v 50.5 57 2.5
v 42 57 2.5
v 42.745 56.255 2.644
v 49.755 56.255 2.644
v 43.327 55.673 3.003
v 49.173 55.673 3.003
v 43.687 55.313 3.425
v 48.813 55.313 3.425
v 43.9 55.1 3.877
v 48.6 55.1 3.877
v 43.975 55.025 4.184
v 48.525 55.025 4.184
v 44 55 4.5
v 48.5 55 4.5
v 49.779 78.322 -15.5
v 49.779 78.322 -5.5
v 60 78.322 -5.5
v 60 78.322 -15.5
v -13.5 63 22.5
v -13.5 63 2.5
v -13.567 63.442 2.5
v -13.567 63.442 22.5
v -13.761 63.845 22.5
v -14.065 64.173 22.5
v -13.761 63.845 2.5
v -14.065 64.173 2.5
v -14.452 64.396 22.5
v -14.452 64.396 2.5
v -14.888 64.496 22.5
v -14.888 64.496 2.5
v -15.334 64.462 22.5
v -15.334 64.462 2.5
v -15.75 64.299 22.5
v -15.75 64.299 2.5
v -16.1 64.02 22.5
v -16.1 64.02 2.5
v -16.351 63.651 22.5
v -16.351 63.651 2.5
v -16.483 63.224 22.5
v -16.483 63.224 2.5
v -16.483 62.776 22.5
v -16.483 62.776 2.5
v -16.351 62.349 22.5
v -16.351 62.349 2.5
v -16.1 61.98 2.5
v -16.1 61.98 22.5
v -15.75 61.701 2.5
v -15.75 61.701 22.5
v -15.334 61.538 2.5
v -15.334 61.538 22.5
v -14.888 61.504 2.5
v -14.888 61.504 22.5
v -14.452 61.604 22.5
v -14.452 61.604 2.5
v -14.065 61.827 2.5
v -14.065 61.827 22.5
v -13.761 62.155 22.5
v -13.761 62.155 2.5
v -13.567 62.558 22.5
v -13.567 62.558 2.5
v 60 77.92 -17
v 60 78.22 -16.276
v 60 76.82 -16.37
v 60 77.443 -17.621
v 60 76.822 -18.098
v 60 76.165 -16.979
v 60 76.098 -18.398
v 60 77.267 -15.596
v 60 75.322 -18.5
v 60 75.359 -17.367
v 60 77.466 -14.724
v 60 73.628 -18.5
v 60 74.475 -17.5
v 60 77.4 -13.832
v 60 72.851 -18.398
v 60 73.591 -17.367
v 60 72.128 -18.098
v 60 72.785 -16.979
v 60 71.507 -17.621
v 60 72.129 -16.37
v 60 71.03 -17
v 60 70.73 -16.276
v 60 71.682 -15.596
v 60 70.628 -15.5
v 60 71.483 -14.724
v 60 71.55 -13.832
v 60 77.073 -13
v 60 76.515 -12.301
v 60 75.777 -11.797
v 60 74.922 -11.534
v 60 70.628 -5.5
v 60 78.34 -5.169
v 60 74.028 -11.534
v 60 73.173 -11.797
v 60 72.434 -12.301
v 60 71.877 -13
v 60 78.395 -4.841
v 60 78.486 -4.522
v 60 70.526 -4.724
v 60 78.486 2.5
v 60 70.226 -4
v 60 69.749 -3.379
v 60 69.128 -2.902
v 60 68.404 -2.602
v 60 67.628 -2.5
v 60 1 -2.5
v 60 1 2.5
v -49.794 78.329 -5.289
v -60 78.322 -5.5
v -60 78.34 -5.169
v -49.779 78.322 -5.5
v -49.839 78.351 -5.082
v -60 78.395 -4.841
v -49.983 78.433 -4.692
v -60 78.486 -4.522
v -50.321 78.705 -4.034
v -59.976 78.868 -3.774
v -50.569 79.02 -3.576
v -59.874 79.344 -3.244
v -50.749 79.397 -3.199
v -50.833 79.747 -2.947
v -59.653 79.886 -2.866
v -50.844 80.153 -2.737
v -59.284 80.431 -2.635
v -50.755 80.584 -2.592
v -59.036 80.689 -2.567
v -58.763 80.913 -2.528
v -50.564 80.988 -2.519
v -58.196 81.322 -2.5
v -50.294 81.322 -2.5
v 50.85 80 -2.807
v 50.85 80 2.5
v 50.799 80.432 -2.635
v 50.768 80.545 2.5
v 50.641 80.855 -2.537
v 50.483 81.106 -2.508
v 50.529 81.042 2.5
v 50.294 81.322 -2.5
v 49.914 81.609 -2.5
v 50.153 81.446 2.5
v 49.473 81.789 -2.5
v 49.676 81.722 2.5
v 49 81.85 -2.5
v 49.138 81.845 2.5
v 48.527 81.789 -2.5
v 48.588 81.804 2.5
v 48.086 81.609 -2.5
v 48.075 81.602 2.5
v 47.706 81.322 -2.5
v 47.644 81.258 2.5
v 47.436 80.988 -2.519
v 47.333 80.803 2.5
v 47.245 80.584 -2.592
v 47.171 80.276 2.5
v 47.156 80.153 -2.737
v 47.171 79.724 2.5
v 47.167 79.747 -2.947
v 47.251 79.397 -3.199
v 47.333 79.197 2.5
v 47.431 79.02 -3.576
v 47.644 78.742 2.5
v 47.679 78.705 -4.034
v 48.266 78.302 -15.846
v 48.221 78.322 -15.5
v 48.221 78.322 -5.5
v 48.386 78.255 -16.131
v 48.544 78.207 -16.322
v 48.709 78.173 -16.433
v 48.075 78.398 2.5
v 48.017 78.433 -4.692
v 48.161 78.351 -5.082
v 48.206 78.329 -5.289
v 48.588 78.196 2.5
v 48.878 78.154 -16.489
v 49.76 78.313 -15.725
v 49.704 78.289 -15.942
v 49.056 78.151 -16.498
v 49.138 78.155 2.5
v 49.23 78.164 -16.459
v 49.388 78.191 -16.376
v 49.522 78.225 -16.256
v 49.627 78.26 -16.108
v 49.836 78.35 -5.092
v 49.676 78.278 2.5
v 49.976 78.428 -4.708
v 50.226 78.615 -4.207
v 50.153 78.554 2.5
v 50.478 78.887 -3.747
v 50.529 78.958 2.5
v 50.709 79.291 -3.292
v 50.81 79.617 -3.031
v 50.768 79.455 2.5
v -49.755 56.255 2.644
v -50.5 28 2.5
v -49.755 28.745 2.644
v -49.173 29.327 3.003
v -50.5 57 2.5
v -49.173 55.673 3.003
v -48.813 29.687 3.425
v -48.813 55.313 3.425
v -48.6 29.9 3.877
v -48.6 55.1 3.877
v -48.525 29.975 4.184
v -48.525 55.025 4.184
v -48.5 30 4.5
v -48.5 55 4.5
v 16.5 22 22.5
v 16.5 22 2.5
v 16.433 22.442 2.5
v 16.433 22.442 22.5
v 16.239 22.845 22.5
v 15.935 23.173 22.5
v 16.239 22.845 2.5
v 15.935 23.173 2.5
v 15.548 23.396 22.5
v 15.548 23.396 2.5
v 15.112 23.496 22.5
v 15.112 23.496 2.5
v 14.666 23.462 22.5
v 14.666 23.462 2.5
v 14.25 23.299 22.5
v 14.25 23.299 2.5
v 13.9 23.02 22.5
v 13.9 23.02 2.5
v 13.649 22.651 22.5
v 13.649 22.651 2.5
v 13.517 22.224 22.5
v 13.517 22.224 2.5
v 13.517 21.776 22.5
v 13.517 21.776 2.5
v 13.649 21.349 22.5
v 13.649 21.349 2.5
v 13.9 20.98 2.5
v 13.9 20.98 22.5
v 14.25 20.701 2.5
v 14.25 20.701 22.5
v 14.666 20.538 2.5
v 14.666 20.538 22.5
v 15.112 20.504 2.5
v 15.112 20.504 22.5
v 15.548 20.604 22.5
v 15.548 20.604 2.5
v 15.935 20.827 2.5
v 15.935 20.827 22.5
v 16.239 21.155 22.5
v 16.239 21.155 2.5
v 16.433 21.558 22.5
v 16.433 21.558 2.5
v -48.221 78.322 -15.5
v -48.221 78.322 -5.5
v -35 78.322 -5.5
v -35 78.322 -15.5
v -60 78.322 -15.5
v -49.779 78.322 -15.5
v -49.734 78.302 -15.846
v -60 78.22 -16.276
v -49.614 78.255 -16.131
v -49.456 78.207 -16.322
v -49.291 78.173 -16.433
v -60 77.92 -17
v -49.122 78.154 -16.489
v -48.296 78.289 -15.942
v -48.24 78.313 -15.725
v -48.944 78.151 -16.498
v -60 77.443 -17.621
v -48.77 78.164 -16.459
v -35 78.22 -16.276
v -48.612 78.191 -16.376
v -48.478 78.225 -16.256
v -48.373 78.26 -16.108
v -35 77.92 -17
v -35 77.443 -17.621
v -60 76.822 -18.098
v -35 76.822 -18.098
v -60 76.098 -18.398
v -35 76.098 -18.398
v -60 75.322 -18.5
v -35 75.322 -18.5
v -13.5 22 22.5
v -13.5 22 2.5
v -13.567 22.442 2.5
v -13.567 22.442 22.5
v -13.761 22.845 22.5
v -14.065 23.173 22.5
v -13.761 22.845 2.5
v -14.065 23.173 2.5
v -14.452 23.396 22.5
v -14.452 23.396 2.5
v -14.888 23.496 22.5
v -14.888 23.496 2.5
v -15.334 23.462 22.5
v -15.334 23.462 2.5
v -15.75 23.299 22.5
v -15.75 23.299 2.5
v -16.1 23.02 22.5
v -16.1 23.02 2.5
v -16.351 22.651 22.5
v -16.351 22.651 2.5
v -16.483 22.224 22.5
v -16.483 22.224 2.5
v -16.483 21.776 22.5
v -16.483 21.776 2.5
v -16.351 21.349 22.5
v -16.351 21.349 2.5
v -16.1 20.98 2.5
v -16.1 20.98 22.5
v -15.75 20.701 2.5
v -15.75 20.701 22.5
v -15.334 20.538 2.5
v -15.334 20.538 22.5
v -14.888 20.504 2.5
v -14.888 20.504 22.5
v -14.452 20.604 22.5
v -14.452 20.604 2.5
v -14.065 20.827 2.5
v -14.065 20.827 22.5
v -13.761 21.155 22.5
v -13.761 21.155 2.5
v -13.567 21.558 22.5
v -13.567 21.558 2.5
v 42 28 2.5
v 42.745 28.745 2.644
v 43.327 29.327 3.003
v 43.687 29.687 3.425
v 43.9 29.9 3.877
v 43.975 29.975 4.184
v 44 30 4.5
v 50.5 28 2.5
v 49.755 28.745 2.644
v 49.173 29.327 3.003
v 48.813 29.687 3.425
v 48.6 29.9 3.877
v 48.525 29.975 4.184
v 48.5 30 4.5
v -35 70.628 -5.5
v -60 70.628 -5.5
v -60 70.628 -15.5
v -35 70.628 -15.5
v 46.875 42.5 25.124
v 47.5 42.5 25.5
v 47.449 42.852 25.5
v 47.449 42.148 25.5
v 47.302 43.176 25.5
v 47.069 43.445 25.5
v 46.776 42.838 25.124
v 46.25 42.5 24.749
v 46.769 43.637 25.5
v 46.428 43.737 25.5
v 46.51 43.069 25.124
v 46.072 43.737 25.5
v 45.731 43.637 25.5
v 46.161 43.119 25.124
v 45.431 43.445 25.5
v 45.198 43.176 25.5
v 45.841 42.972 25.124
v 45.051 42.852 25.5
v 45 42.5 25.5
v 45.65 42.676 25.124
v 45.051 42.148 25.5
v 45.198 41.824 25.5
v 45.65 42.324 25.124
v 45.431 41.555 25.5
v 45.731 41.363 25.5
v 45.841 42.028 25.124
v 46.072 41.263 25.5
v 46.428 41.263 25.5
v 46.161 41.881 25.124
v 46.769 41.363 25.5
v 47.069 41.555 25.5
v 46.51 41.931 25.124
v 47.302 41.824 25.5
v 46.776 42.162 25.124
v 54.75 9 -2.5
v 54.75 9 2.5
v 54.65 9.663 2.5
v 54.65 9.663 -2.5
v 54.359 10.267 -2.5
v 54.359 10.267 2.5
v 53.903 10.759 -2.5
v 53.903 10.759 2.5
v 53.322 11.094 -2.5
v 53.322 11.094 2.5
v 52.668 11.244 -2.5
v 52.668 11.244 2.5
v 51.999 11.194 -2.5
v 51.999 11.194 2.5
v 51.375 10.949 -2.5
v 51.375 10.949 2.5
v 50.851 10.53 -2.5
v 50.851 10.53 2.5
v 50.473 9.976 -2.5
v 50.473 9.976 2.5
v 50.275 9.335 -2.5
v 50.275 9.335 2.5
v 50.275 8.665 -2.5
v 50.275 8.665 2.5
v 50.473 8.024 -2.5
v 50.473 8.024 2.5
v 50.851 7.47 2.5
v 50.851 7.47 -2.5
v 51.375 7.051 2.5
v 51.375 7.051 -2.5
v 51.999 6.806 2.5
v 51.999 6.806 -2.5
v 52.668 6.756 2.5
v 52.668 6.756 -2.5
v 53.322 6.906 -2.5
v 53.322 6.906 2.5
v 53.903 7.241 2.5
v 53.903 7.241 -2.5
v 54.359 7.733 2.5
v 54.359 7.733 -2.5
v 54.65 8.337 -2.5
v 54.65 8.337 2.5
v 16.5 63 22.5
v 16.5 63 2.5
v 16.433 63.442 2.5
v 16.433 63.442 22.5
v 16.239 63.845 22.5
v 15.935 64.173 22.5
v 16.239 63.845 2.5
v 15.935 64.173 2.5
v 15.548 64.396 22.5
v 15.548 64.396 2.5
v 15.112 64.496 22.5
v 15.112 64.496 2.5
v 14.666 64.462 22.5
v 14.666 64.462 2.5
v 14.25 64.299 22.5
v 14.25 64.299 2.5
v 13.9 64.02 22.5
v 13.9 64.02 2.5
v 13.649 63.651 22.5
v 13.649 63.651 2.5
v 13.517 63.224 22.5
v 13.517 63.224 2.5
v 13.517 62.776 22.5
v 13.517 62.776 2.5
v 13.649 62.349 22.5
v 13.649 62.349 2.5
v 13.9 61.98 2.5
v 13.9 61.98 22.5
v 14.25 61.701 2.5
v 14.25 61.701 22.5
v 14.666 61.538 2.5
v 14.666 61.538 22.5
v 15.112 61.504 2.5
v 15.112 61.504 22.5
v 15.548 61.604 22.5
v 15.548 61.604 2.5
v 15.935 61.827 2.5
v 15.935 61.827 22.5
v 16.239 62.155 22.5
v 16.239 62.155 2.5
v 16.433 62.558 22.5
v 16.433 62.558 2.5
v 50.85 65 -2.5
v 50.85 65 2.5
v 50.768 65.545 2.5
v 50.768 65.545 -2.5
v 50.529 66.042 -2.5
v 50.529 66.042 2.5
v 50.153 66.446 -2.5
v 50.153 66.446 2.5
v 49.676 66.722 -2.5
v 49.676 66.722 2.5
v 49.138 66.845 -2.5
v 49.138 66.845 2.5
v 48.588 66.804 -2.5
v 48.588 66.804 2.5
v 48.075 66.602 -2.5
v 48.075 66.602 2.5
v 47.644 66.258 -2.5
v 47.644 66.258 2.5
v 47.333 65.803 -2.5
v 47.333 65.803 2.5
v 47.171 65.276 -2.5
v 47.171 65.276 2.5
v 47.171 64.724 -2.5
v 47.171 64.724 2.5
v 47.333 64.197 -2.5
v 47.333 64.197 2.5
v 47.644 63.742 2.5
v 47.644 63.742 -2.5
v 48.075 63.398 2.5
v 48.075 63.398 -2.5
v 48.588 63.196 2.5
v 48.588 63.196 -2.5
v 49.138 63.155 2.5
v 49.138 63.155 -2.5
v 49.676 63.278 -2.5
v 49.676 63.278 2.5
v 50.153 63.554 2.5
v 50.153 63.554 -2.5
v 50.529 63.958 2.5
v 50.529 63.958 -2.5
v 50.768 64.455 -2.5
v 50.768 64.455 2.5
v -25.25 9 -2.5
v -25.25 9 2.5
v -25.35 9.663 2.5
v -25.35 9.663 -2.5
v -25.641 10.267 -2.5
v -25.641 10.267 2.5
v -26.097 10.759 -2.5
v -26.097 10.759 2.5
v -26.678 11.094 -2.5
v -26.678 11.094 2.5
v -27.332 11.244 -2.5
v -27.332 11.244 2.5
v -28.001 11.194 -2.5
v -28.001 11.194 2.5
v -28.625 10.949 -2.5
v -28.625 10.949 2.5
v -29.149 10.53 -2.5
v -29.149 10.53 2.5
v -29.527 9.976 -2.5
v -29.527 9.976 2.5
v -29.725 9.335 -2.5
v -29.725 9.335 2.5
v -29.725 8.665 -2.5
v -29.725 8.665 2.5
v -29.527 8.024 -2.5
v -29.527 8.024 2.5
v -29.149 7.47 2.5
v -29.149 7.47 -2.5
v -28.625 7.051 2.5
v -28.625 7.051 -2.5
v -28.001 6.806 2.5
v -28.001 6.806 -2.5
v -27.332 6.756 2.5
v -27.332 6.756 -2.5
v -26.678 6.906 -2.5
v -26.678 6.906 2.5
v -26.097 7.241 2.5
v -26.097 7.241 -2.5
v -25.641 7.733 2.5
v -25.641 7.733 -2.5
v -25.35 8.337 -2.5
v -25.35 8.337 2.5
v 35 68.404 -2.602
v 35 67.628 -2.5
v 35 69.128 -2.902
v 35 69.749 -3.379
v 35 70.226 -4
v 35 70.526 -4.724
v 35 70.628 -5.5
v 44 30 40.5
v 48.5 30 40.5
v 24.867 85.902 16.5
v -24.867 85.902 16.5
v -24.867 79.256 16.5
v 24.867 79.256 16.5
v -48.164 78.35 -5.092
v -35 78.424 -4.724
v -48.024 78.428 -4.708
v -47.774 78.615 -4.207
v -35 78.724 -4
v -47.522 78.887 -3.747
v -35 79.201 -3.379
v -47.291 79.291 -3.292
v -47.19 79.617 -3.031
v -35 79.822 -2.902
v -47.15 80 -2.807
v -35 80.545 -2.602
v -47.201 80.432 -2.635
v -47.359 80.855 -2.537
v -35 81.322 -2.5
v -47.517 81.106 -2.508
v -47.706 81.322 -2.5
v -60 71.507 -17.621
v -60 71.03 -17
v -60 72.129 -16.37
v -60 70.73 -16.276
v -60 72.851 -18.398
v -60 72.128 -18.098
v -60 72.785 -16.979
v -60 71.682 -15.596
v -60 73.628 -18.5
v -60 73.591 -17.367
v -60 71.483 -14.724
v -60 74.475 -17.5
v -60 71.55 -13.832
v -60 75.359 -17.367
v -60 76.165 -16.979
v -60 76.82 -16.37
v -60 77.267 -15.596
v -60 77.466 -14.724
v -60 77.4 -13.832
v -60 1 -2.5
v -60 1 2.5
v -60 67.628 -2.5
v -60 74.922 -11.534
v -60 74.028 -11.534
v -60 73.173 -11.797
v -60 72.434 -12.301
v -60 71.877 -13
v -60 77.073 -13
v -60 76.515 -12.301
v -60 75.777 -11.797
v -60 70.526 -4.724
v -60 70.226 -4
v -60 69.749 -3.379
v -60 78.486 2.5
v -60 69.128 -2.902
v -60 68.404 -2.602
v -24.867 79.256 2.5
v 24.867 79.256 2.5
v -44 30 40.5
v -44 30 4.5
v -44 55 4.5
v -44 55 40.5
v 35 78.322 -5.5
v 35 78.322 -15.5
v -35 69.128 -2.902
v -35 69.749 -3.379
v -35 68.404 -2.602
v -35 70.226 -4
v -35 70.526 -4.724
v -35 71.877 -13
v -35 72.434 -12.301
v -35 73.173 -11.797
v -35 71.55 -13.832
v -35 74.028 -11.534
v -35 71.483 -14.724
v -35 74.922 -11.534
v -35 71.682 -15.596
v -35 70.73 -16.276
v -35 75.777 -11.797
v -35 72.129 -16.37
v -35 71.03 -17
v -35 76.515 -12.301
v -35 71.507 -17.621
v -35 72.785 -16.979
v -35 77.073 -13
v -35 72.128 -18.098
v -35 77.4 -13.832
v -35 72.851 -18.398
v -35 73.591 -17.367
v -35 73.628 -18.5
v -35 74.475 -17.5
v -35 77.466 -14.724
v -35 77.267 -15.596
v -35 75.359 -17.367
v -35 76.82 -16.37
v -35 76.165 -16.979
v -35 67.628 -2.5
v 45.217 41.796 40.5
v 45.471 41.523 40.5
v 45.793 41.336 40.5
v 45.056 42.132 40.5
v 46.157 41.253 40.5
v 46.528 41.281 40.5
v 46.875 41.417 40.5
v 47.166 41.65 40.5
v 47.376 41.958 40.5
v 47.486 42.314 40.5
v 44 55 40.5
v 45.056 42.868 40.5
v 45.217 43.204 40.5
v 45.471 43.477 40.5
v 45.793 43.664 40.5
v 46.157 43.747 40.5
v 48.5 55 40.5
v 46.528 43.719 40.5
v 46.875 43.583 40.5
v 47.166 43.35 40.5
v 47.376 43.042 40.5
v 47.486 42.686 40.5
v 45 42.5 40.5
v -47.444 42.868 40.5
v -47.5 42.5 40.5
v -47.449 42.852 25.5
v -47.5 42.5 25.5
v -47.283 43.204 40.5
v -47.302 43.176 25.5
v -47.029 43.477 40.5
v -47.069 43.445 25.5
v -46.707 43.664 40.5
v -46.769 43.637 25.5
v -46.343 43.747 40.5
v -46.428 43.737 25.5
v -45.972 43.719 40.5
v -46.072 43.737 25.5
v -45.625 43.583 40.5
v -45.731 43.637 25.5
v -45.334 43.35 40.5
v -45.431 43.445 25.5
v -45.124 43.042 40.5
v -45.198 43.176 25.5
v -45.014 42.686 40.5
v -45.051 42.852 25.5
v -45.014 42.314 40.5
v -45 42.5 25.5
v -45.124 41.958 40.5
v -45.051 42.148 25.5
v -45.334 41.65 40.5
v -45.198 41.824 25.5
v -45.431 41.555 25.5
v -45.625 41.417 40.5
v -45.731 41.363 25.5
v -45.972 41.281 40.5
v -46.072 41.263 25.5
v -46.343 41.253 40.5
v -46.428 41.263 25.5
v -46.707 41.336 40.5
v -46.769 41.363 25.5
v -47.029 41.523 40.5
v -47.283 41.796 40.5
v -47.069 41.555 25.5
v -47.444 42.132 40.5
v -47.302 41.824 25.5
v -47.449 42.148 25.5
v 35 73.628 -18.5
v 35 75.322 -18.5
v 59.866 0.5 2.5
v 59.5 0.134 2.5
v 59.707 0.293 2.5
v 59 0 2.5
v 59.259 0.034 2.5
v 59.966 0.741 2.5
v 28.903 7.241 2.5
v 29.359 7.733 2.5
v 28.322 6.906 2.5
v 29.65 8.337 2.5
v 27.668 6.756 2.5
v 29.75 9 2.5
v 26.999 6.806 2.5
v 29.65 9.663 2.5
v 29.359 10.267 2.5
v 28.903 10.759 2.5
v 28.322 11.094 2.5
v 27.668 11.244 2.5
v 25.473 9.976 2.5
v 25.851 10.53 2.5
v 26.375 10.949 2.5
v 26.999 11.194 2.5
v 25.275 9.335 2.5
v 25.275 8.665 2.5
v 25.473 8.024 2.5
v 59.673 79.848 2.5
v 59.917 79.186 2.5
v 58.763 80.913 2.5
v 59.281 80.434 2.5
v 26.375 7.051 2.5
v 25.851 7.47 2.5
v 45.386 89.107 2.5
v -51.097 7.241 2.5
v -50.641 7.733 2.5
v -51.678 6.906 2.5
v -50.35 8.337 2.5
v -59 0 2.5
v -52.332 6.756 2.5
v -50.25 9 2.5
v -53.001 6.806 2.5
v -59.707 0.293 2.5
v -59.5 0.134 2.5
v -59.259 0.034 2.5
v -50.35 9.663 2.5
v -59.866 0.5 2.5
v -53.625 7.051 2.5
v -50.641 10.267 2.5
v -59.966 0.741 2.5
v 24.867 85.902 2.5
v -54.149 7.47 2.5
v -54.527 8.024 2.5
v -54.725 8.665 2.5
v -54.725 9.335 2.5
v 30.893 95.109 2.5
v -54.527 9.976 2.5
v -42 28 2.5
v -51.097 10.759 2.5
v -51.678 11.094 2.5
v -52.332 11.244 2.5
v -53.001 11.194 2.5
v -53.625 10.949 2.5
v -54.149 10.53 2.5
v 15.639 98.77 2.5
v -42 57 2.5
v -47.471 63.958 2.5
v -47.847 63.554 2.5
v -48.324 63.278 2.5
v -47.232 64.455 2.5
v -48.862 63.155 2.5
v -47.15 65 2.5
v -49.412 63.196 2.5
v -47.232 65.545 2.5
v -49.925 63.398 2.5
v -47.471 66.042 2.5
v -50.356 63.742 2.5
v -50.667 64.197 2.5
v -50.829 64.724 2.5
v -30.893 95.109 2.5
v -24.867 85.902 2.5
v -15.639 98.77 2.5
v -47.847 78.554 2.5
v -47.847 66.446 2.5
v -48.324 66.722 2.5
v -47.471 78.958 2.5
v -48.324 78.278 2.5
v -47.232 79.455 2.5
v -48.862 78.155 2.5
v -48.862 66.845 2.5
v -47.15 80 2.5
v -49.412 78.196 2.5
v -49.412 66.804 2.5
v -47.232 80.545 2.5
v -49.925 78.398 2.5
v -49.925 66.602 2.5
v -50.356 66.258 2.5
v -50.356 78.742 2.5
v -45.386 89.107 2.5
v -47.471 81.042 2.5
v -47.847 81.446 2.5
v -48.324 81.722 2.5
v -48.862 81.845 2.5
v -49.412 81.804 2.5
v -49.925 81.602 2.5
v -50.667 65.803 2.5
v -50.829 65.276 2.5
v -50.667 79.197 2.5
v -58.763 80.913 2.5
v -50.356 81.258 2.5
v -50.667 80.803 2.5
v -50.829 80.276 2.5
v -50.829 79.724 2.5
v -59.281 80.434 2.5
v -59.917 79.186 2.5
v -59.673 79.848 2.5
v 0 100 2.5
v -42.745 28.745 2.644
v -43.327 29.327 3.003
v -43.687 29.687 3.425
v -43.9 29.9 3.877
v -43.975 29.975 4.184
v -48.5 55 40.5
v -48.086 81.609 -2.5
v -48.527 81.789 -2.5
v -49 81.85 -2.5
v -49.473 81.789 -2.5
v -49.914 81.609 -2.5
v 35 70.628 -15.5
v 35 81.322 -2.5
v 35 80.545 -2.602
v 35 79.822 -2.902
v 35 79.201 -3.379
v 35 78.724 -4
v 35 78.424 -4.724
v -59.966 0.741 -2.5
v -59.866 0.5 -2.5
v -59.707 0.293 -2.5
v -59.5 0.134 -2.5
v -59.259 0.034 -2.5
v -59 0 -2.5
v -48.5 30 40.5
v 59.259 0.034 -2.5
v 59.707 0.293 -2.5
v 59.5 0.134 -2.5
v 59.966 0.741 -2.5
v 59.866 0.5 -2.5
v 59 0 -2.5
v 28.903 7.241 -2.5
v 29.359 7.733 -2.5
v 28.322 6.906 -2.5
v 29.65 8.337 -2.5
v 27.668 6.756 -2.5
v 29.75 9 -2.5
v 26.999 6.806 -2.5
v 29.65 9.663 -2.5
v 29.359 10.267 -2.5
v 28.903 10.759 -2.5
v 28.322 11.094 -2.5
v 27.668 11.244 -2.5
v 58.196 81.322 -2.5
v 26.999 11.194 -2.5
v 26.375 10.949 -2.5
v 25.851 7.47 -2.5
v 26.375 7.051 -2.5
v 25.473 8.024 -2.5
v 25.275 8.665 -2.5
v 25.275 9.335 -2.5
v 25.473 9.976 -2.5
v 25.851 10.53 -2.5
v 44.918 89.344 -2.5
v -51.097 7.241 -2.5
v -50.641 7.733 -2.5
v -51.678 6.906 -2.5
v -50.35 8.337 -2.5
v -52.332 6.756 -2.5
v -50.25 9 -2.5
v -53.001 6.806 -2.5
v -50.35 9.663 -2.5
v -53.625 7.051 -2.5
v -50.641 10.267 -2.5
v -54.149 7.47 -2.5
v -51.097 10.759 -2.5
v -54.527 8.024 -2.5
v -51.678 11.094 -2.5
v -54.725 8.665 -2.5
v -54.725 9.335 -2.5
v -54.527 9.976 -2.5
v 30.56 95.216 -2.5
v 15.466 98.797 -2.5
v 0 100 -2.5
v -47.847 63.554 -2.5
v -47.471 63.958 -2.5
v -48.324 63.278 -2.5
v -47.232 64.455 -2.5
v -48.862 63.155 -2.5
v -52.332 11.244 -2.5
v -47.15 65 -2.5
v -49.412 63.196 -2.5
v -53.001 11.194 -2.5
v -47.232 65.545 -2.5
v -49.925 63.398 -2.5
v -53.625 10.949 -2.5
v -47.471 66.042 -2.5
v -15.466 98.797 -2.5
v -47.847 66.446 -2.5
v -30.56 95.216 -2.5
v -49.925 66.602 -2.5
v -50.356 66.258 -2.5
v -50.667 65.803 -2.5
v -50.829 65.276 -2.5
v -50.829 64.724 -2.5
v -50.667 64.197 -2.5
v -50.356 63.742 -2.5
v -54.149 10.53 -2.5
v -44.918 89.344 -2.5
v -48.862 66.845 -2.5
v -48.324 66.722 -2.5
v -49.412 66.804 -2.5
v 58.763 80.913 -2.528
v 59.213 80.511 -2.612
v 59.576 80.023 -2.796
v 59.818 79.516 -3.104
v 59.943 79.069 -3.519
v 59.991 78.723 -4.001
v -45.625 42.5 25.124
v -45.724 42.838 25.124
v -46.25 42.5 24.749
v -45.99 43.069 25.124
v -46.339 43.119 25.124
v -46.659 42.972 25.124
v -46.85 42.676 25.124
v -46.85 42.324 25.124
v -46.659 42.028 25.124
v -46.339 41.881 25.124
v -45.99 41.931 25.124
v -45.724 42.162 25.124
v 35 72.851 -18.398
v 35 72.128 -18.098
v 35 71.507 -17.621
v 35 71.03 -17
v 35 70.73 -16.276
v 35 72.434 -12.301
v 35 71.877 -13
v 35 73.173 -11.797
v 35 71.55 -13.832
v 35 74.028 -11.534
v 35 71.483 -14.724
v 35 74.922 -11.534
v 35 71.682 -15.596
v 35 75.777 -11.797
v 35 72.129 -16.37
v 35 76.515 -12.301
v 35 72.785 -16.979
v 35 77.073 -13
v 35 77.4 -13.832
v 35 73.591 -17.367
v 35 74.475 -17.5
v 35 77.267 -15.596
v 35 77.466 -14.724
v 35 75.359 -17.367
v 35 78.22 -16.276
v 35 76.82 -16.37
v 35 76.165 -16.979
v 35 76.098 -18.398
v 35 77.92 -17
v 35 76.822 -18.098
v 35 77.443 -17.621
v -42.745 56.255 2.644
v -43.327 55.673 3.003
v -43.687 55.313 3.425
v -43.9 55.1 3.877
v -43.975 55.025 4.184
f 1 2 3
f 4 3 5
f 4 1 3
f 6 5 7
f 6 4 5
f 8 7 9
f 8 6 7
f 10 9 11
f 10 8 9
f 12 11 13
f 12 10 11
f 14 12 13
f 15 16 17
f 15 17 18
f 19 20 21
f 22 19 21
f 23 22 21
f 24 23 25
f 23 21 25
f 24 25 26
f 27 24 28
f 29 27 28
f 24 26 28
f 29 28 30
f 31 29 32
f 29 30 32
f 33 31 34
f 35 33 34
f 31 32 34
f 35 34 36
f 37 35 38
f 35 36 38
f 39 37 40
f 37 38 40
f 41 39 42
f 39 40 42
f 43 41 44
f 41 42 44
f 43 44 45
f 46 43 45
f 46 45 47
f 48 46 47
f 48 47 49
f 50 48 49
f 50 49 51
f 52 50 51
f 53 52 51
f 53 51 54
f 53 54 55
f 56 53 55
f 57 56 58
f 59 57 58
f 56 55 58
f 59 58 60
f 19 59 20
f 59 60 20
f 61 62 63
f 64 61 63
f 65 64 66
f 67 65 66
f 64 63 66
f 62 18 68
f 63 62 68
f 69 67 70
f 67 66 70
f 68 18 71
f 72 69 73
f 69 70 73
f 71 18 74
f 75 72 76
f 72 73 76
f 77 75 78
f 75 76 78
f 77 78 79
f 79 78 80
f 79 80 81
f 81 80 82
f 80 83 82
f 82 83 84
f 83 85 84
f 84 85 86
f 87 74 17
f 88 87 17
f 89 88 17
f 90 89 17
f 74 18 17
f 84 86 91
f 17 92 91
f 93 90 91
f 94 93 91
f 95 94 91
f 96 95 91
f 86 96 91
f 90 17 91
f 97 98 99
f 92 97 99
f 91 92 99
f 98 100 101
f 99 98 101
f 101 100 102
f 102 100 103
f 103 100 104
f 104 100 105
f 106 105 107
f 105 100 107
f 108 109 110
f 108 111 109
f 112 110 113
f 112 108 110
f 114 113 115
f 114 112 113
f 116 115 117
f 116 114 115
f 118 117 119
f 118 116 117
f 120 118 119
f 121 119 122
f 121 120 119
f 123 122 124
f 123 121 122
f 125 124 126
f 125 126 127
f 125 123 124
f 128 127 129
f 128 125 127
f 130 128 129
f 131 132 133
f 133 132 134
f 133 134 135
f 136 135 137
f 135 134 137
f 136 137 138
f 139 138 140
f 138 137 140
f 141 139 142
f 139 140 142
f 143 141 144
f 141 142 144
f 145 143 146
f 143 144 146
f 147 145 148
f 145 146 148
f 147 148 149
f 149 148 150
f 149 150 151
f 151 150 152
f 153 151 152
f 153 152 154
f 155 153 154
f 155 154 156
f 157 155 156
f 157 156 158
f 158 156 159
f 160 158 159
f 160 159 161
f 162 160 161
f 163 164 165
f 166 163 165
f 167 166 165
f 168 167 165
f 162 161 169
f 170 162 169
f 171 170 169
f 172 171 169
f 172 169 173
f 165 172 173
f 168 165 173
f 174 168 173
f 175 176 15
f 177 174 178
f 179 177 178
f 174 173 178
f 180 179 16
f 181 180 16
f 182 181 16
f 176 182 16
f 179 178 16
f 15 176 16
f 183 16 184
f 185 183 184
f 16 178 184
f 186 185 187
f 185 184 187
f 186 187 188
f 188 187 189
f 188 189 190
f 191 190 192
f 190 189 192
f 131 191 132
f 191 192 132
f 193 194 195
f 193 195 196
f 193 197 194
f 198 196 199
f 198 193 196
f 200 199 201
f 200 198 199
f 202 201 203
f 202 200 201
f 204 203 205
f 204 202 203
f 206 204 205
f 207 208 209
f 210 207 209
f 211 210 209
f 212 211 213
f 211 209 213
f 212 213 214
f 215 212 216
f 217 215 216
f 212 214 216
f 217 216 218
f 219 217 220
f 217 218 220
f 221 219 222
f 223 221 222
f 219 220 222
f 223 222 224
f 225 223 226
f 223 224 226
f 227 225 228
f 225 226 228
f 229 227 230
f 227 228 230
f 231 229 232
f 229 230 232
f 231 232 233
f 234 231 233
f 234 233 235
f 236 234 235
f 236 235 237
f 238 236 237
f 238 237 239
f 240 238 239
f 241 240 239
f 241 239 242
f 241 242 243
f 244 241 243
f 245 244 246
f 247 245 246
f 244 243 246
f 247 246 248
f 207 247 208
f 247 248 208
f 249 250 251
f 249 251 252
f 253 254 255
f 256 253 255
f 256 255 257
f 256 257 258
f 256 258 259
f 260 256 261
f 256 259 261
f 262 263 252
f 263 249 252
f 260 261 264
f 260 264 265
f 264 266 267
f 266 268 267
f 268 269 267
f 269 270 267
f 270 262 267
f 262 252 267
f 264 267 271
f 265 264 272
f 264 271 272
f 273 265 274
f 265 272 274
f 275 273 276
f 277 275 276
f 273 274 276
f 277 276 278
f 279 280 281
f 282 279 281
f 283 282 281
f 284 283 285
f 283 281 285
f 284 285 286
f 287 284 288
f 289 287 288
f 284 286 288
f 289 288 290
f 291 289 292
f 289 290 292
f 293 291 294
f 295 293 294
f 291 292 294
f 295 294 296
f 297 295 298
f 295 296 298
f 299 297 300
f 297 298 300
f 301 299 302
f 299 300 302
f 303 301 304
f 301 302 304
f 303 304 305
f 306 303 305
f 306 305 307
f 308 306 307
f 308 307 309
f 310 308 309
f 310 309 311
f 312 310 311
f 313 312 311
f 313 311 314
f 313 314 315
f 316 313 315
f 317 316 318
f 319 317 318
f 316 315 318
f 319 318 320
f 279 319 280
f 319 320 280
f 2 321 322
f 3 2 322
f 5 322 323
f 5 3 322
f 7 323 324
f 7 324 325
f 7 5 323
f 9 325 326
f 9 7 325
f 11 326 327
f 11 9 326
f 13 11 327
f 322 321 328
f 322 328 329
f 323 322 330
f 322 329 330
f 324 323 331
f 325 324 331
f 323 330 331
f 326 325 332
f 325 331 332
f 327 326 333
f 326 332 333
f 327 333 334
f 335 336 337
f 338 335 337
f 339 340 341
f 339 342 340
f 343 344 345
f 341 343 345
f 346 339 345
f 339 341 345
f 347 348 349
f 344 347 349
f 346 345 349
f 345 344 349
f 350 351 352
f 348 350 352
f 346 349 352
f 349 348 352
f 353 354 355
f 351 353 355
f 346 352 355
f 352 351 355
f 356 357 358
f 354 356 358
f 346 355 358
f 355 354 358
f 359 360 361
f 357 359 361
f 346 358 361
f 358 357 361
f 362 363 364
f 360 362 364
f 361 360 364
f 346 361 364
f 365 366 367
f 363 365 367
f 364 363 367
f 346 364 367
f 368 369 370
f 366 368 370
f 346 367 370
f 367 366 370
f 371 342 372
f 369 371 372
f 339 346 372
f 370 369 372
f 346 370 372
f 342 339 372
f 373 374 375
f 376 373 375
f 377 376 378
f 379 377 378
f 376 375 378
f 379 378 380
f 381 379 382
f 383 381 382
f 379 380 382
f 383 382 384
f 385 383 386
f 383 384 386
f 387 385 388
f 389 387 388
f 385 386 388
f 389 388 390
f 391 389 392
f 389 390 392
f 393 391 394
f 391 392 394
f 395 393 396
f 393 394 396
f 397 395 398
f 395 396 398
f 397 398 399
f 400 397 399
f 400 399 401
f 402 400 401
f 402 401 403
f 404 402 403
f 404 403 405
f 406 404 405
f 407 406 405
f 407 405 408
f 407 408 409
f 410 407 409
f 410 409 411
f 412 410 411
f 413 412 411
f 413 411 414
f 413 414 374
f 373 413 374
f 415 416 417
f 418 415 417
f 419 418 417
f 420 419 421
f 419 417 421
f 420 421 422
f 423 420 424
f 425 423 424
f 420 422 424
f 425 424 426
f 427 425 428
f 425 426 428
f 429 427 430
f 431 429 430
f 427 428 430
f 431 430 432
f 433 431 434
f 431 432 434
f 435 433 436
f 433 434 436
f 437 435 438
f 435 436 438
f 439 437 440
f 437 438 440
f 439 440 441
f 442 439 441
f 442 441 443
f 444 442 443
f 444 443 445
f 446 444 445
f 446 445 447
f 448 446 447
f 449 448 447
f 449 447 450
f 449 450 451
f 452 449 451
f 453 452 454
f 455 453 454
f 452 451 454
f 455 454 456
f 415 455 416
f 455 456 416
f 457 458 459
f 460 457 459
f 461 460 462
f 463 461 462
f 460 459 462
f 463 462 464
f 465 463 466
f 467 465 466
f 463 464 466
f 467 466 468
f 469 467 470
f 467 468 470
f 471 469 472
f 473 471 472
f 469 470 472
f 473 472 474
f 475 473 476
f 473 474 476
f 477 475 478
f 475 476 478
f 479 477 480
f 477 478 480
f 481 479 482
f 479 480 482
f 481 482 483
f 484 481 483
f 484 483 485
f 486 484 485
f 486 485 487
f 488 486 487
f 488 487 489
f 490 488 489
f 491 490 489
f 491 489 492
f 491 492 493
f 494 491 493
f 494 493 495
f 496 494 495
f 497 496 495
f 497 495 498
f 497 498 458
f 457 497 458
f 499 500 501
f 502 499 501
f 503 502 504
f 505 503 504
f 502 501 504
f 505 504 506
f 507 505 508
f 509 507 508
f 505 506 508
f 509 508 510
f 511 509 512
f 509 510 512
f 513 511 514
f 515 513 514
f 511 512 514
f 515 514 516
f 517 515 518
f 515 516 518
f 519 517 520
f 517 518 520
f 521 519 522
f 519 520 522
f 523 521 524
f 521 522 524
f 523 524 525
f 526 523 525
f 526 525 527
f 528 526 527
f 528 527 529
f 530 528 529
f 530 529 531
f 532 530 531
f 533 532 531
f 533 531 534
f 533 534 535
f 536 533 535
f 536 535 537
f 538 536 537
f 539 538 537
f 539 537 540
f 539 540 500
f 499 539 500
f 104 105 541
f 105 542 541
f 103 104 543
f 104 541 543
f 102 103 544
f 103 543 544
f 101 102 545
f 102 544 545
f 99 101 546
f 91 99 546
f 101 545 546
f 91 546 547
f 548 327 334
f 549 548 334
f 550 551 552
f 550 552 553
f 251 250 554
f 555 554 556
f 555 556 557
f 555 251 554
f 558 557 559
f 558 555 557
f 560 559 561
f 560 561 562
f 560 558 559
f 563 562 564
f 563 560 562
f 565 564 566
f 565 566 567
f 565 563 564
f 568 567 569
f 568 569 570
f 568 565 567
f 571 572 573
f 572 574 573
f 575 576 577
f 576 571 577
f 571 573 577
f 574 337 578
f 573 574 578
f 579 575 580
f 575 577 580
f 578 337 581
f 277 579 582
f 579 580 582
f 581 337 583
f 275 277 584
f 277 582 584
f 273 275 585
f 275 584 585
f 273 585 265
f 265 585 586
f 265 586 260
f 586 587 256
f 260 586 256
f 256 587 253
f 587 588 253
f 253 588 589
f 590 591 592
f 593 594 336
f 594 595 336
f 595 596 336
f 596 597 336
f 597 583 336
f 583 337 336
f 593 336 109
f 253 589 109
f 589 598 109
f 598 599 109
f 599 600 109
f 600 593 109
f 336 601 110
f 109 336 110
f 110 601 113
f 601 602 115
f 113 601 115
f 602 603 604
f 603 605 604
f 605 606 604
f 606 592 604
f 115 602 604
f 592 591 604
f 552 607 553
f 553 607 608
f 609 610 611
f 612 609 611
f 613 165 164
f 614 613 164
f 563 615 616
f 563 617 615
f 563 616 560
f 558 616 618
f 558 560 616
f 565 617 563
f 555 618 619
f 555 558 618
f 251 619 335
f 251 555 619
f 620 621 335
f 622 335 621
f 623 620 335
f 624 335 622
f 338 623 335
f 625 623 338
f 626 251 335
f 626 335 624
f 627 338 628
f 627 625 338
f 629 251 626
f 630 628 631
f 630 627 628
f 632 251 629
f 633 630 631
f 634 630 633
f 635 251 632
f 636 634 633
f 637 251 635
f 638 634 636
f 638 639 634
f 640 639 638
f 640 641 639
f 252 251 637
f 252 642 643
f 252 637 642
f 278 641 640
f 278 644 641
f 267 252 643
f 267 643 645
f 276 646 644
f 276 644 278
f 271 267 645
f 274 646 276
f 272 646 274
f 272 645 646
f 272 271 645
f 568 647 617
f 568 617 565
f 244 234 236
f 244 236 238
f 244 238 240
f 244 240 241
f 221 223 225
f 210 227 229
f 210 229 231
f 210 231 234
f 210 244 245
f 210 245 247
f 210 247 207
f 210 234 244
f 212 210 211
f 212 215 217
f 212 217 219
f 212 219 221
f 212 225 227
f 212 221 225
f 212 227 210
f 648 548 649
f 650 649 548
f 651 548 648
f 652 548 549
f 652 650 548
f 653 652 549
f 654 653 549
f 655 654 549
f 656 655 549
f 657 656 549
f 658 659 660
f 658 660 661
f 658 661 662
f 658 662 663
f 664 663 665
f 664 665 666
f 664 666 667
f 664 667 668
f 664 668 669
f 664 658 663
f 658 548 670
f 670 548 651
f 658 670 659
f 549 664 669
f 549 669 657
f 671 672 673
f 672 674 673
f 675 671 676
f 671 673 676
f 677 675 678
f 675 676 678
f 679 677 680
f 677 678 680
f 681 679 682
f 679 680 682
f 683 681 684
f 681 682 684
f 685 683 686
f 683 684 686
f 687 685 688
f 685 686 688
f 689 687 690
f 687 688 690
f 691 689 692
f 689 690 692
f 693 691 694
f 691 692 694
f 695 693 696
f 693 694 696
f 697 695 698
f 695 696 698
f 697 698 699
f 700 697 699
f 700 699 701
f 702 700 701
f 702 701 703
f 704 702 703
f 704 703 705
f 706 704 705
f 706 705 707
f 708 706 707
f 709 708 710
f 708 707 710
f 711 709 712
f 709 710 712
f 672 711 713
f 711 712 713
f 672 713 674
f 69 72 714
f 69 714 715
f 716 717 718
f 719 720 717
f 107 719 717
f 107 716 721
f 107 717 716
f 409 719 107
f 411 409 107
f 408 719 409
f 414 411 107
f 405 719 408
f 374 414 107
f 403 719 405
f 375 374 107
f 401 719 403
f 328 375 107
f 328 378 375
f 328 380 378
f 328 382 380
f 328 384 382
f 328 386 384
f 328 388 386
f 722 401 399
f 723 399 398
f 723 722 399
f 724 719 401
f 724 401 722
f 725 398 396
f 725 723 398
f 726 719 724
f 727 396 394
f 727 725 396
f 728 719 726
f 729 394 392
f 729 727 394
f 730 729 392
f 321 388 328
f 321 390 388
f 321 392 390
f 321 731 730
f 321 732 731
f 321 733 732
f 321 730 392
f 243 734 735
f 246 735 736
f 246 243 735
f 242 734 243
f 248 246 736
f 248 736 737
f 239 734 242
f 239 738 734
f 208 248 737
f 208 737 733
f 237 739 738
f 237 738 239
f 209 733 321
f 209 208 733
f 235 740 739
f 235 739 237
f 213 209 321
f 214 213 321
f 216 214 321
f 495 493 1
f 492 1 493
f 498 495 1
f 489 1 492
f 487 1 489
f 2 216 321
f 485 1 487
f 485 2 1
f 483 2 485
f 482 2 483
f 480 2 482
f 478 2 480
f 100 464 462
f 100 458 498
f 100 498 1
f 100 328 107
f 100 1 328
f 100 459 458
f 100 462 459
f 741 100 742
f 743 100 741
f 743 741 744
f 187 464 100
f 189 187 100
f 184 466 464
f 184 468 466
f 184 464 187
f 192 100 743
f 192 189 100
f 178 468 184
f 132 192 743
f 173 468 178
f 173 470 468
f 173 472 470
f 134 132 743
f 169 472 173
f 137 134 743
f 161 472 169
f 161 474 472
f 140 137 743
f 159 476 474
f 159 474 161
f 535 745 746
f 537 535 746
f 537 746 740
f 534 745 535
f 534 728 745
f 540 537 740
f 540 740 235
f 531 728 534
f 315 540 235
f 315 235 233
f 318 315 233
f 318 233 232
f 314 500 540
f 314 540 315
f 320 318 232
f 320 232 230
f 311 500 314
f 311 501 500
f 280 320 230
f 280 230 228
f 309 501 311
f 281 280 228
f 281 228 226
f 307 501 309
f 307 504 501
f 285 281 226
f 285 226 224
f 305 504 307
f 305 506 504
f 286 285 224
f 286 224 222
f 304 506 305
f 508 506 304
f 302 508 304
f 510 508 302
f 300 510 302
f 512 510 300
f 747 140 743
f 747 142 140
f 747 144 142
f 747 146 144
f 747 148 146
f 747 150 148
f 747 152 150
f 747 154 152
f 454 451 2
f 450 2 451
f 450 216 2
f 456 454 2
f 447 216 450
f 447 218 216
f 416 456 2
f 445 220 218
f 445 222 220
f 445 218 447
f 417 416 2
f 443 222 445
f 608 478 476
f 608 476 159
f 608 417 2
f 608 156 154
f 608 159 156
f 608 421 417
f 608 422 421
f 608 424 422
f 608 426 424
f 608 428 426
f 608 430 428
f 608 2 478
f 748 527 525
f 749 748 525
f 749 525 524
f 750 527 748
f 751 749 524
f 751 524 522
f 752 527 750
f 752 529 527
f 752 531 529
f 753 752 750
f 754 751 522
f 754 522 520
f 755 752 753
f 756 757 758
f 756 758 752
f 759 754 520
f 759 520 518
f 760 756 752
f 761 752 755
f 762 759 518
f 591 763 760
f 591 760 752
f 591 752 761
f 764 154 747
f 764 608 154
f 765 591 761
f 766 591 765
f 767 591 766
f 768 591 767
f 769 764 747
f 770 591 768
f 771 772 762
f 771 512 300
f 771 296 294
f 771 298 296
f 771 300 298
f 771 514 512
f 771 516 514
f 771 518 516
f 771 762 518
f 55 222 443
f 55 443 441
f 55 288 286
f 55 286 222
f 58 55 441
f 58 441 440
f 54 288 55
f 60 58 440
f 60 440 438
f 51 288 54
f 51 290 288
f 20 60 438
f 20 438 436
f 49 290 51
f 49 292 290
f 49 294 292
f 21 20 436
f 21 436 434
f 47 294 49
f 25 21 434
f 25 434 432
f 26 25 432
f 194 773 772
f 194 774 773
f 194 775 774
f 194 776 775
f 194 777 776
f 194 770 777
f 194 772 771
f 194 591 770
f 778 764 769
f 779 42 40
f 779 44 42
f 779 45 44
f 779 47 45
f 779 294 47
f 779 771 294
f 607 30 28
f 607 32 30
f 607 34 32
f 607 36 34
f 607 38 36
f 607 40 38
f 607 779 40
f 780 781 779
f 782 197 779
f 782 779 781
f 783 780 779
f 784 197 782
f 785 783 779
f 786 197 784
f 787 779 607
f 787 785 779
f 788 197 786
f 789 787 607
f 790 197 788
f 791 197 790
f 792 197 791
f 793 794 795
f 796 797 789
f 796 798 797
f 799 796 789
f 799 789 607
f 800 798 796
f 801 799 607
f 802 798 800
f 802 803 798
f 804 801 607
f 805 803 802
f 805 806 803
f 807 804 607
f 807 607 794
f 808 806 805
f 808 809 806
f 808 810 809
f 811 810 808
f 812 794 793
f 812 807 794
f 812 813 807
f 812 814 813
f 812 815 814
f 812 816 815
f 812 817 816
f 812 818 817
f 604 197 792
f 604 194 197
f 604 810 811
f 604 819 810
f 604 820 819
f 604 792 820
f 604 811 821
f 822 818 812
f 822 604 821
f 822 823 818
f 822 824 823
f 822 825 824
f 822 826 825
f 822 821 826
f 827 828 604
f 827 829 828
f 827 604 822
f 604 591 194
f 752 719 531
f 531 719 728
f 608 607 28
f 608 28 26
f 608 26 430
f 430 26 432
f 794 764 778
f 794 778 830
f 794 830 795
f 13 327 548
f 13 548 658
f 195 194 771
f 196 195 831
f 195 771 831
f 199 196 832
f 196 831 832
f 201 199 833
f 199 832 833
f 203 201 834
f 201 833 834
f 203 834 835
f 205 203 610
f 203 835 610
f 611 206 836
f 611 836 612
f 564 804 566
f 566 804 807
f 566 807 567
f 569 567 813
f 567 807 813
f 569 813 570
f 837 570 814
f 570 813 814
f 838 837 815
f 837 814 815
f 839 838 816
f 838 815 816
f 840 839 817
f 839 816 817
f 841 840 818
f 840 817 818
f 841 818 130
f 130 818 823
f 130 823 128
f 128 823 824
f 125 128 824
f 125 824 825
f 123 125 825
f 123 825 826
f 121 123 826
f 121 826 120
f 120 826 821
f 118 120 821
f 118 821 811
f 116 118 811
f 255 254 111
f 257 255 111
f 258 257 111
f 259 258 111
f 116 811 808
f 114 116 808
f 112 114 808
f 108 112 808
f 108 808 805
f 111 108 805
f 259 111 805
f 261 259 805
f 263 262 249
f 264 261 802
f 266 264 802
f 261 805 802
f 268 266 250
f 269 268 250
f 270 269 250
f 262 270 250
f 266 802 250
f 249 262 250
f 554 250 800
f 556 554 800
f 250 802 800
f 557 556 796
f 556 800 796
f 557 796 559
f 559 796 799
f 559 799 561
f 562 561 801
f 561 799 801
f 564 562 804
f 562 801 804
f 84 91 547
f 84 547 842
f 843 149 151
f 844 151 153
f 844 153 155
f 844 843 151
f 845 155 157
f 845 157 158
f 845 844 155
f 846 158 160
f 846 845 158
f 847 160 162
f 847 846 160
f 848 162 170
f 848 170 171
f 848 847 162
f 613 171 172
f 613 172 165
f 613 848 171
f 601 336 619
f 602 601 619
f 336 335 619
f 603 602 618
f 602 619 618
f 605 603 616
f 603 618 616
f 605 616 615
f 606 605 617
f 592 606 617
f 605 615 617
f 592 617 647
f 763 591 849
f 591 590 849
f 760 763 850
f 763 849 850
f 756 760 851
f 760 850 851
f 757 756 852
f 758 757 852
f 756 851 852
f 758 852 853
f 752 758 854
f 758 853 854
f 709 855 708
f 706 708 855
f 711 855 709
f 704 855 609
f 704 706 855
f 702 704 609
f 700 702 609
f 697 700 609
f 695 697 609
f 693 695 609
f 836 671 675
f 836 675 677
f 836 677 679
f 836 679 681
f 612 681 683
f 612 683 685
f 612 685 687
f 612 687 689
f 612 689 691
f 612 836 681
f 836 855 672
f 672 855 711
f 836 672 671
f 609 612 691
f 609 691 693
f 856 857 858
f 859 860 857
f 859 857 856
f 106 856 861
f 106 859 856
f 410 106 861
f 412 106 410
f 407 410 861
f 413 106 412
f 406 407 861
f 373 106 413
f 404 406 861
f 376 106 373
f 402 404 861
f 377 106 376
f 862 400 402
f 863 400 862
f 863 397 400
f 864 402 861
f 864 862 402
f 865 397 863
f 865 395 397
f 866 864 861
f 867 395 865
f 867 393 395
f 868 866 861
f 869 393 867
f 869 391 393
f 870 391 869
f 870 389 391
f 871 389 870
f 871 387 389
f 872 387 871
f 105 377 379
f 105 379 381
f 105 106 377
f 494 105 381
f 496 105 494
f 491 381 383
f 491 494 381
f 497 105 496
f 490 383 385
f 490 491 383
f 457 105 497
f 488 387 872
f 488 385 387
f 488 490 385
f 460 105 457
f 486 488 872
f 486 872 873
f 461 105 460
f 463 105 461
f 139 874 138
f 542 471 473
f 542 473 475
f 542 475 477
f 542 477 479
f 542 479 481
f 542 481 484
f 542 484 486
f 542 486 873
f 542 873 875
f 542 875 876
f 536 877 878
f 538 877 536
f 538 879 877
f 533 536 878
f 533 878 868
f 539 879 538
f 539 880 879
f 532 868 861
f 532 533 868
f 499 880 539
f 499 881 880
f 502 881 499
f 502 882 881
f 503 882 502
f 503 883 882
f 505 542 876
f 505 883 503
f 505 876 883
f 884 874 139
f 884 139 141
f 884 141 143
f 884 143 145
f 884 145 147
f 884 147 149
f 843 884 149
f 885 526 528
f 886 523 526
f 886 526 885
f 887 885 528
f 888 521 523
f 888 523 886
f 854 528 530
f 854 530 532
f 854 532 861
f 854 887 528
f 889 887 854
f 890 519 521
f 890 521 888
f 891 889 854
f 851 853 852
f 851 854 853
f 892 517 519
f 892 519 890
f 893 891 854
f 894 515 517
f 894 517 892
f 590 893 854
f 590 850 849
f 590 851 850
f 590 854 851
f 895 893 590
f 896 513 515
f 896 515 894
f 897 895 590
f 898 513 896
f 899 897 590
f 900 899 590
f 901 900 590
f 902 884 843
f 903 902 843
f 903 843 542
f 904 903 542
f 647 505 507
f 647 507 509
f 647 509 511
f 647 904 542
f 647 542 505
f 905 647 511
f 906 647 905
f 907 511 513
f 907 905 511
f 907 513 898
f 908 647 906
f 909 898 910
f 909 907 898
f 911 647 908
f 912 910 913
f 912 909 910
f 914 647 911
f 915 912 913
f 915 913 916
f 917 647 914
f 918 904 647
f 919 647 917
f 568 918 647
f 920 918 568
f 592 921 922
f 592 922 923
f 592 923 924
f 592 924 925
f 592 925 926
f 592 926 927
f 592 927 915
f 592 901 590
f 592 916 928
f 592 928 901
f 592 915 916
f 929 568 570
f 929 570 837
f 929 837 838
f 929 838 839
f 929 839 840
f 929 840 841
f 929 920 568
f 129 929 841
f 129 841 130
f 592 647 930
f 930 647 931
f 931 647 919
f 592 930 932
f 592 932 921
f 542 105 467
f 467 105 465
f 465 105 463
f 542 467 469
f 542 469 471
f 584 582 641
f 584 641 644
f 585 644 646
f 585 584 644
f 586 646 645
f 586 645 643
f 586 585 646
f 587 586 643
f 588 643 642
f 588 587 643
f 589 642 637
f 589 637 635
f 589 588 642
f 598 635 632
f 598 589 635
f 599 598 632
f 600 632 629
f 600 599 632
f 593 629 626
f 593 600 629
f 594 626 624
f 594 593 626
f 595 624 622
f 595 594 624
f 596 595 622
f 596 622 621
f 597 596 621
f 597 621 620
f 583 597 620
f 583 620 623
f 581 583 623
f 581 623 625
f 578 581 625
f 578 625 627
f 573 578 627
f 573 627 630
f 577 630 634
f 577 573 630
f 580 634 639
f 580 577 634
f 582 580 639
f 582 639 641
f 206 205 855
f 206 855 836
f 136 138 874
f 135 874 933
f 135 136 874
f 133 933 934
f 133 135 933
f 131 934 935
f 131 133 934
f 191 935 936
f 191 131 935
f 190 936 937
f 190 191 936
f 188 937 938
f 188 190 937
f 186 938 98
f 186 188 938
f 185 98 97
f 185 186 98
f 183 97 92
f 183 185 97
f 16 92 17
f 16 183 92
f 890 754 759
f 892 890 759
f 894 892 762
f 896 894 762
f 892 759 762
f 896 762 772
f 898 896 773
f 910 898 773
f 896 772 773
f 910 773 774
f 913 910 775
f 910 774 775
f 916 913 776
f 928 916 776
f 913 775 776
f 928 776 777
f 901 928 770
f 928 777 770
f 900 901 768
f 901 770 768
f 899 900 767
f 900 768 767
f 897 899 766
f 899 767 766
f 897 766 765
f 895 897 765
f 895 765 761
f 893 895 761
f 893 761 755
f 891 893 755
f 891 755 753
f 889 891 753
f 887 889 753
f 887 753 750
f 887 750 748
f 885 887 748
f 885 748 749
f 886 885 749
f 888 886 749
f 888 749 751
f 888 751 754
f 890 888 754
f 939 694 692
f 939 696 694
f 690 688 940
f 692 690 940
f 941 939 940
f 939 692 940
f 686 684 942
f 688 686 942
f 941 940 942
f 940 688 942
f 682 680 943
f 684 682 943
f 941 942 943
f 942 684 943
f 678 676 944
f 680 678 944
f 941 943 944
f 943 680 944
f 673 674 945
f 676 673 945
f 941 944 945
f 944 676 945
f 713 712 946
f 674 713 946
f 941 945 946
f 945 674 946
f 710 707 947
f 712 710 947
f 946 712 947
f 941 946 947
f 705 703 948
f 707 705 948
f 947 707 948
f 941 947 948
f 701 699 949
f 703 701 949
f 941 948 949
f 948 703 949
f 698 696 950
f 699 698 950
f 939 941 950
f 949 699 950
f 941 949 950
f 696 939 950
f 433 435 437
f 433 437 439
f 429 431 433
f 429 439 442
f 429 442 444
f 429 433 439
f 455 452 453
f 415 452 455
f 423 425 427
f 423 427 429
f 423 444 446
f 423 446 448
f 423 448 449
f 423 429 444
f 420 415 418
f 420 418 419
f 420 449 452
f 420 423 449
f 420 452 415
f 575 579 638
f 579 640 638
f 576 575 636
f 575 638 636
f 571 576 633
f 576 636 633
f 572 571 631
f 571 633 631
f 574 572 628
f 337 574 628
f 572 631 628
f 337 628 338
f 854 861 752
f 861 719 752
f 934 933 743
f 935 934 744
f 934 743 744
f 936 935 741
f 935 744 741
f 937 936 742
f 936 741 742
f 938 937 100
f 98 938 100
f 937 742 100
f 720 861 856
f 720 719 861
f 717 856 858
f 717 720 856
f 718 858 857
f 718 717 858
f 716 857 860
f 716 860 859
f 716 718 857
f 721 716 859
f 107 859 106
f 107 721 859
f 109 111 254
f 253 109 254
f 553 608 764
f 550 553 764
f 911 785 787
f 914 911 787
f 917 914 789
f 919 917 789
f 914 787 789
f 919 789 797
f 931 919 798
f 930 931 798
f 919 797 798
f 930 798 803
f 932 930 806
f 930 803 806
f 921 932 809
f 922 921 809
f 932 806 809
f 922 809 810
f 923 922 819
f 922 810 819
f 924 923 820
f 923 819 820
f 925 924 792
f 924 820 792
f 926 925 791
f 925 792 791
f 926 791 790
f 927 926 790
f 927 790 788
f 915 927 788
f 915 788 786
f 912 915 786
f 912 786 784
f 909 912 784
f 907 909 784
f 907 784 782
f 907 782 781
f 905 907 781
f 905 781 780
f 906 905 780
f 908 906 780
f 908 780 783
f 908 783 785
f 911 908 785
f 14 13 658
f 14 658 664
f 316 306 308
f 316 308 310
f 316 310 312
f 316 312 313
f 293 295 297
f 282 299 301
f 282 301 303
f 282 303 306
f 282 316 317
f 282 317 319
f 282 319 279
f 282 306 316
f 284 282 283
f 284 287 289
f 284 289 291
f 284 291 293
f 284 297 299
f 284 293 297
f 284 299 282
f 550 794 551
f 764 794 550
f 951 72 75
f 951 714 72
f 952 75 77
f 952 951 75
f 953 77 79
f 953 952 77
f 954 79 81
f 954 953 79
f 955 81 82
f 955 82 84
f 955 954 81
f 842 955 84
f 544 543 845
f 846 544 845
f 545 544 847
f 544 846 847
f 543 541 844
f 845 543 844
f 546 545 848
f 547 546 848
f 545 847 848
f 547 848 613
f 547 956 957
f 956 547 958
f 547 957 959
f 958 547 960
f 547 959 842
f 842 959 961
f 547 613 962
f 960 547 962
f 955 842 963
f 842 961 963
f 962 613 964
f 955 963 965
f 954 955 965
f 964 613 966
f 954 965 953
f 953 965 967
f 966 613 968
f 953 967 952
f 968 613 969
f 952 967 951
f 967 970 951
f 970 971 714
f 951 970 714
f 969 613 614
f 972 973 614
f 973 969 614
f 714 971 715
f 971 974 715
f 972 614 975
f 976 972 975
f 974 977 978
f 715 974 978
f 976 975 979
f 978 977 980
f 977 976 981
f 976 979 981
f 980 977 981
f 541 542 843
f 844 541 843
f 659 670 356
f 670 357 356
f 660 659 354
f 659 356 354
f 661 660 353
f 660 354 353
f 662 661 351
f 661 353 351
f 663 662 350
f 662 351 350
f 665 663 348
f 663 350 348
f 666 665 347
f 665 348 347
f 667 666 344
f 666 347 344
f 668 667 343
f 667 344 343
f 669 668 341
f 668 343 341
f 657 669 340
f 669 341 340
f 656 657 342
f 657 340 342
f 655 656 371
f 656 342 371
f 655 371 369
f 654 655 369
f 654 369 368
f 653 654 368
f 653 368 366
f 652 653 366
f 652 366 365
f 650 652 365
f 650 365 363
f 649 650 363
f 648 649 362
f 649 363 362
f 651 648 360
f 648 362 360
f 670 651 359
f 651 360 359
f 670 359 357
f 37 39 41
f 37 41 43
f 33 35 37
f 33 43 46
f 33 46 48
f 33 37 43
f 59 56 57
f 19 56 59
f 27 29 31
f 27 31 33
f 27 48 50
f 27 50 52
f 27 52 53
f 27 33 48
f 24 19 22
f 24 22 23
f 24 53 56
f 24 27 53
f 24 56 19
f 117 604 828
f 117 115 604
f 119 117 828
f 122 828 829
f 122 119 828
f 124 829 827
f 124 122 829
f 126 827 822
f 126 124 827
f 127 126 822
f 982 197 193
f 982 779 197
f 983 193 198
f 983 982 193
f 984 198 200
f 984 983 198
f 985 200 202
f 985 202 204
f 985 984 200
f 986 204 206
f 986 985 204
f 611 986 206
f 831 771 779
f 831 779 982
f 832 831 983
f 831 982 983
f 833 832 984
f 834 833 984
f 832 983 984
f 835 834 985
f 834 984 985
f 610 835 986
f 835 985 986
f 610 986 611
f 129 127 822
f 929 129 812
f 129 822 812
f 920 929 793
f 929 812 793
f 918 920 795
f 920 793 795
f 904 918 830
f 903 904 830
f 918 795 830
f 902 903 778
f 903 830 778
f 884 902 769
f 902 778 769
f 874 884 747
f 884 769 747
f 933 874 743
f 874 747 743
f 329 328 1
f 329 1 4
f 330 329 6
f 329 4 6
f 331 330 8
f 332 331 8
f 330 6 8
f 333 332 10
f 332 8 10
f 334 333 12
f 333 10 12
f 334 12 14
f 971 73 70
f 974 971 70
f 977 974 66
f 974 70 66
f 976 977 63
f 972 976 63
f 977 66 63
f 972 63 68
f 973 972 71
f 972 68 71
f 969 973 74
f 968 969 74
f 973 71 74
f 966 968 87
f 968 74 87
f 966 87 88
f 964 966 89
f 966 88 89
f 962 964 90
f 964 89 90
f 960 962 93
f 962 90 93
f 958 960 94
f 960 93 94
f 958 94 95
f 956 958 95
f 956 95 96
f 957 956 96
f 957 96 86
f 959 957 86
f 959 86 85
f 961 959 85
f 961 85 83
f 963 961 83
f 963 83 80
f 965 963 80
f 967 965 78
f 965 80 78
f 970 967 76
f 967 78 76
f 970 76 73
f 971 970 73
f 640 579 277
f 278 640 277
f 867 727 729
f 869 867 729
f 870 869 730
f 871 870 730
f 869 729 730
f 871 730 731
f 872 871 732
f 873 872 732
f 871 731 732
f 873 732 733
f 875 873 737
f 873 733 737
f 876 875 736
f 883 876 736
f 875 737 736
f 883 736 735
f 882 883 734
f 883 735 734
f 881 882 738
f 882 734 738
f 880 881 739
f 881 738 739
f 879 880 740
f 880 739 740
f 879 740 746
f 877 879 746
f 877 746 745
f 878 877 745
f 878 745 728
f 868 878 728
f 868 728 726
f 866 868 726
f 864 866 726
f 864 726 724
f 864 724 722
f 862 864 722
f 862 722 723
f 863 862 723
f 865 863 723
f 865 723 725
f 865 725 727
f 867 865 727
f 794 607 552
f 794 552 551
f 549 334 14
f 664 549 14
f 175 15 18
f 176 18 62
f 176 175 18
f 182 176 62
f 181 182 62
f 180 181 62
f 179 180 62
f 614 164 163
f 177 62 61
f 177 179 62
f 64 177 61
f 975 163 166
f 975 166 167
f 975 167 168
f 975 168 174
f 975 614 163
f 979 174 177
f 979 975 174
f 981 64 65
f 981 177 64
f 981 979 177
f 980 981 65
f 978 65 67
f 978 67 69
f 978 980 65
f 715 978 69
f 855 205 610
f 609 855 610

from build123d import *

# Parameters (mm, degrees)
BOSS_EXTRUDE1_DEPTH             = 2.5
SKETCH3_R                       = 2.25
CUT_EXTRUDE1_DEPTH              = 6
SKETCH4_W                       = 4.5
SKETCH4_H                       = 25
BOSS_EXTRUDE2_DEPTH             = 38
FILLET2_R                       = 2
TAP_DRILL_FOR_M3X0_5_TAP1_D     = 2.5
TAP_DRILL_FOR_M3X0_5_TAP1_DEPTH = 15
TAP_DRILL_FOR_M3X0_5_TAP1_TIP   = 0.751075774
SKETCH4_3_R                     = 1.5
BOSS_EXTRUDE3_DEPTH             = 20
SKETCH8_W                       = 21
SKETCH8_H                       = 7.693946087
SKETCH8_R                       = 3
BOSS_EXTRUDE4_DEPTH             = 25
FILLET3_R                       = 3
FILLET3_OF_MIRROR1_R            = 3
SKETCH9_W                       = 49.73363163
SKETCH9_H                       = 6.646102353
BOSS_EXTRUDE5_DEPTH             = 14
FILLET5_R                       = 3
FILLET6_R                       = 1
SKETCH10_R                      = 1.85
CUT_EXTRUDE2_DEPTH              = 22


with BuildPart() as part:
    # Sketch1 → Boss-Extrude1 (new body, symmetric)
    with BuildSketch(Plane.XY):
        with BuildLine():
            Line((60, 0), (-60, 0))
            Line((-60, 0), (-60, 80))
            ThreePointArc((-60, 80), (0, 100), (60, 80))
            Line((60, 80), (60, 0))
        make_face()
    extrude(amount=BOSS_EXTRUDE1_DEPTH, both=True)

    # Sketch3 → Cut-Extrude1 (cut, through all)
    with BuildSketch(Plane.XY.offset(2.5)):
        with Locations((-52.5, 9)):
            Circle(SKETCH3_R)
        with Locations((-27.5, 9)):
            Circle(SKETCH3_R)
        with Locations((27.5, 9)):
            Circle(SKETCH3_R)
        with Locations((52.5, 9)):
            Circle(SKETCH3_R)
    extrude(amount=-CUT_EXTRUDE1_DEPTH, mode=Mode.SUBTRACT)

    # Sketch4 → Boss-Extrude2 (add)
    with BuildSketch(Plane.XY.offset(2.5)):
        with Locations((46.25, 42.5)):
            Rectangle(SKETCH4_W, SKETCH4_H)
        with Locations((-46.25, 42.5)):
            Rectangle(SKETCH4_W, SKETCH4_H)
    extrude(amount=BOSS_EXTRUDE2_DEPTH)

    # Fillet2
    fillet2_edges = [part.edges().sort_by_distance(p)[0] for p in [
        (46.25, 55, 2.5),
        (44, 42.5, 2.5),
        (48.5, 42.5, 2.5),
        (46.25, 30, 2.5),
        (-48.5, 42.5, 2.5),
        (-46.25, 30, 2.5),
        (-46.25, 55, 2.5),
        (-44, 42.5, 2.5),
    ]]
    fillet(fillet2_edges, radius=FILLET2_R)

    # Tap Drill for M3x0.5 Tap1
    with Locations(Plane.XY.offset(40.5)):
        with Locations((-46.25, 42.5), (46.25, 42.5)):
            Hole(TAP_DRILL_FOR_M3X0_5_TAP1_D / 2, depth=TAP_DRILL_FOR_M3X0_5_TAP1_DEPTH)
            with Locations((0, 0, -(TAP_DRILL_FOR_M3X0_5_TAP1_DEPTH + TAP_DRILL_FOR_M3X0_5_TAP1_TIP / 2))):  # 118° drill point
                Cone(0, TAP_DRILL_FOR_M3X0_5_TAP1_D / 2, TAP_DRILL_FOR_M3X0_5_TAP1_TIP, mode=Mode.SUBTRACT)

    # Sketch4<3> → Boss-Extrude3 (add)
    with BuildSketch(Plane.XY.offset(2.5)):
        with Locations((-15, 22)):
            Circle(SKETCH4_3_R)
        with Locations((15, 22)):
            Circle(SKETCH4_3_R)
        with Locations((-15, 63)):
            Circle(SKETCH4_3_R)
        with Locations((15, 63)):
            Circle(SKETCH4_3_R)
    extrude(amount=BOSS_EXTRUDE3_DEPTH)

    # Sketch8 → Boss-Extrude4 (add)
    with BuildSketch(Plane(origin=(60, 0, 0), x_dir=(0, 0, -1), z_dir=(1, 0, 0))):
        with Locations((8, 74.474861351)):
            Rectangle(SKETCH8_W, SKETCH8_H)
        with Locations((14.5, 74.474861351)):
            Circle(SKETCH8_R, mode=Mode.SUBTRACT)
    boss_extrude4 = extrude(amount=-BOSS_EXTRUDE4_DEPTH)

    # Fillet3
    fillet3_edges = [part.edges().sort_by_distance(p)[0] for p in [
        (47.5, 70.627888307, -2.5),
        (47.5, 78.321834394, -2.5),
        (47.5, 78.321834394, -18.5),
        (47.5, 70.627888307, -18.5),
    ]]
    fillet(fillet3_edges, radius=FILLET3_R)

    # Mirror1: Boss-Extrude4 across plane
    add(boss_extrude4.mirror(Plane(origin=(0, 0, 0), x_dir=(0, 0, 1), z_dir=(1, 0, 0))))

    # Fillet3 of Mirror1
    fillet3_of_mirror1_edges = [part.edges().sort_by_distance(p)[0] for p in [
        (-47.5, 70.627888307, -2.5),
        (-47.5, 78.321834394, -2.5),
        (-47.5, 78.321834394, -18.5),
        (-47.5, 70.627888307, -18.5),
    ]]
    fillet(fillet3_of_mirror1_edges, radius=FILLET3_OF_MIRROR1_R)

    # Sketch9 → Boss-Extrude5 (add)
    with BuildSketch(Plane.XY.offset(2.5)):
        with Locations((0, 82.579227225)):
            Rectangle(SKETCH9_W, SKETCH9_H)
    extrude(amount=BOSS_EXTRUDE5_DEPTH)

    # Fillet5
    fillet5_edges = [part.edges().sort_by_distance(p)[0] for p in [
        (60, 80, -0.153453135),
        (-60, 80, -0.153453135),
    ]]
    fillet(fillet5_edges, radius=FILLET5_R)

    # Fillet6
    fillet6_edges = [part.edges().sort_by_distance(p)[0] for p in [
        (60, 0, 0),
        (-60, 0, 0),
    ]]
    fillet(fillet6_edges, radius=FILLET6_R)

    # Sketch10 → Cut-Extrude2 (cut, through all)
    with BuildSketch(Plane.XY.offset(2.5)):
        with Locations((49, 80)):
            Circle(SKETCH10_R)
        with Locations((49, 65)):
            Circle(SKETCH10_R)
        with Locations((-49, 65)):
            Circle(SKETCH10_R)
        with Locations((-49, 80)):
            Circle(SKETCH10_R)
    extrude(amount=-CUT_EXTRUDE2_DEPTH, mode=Mode.SUBTRACT)


solid = part.part
